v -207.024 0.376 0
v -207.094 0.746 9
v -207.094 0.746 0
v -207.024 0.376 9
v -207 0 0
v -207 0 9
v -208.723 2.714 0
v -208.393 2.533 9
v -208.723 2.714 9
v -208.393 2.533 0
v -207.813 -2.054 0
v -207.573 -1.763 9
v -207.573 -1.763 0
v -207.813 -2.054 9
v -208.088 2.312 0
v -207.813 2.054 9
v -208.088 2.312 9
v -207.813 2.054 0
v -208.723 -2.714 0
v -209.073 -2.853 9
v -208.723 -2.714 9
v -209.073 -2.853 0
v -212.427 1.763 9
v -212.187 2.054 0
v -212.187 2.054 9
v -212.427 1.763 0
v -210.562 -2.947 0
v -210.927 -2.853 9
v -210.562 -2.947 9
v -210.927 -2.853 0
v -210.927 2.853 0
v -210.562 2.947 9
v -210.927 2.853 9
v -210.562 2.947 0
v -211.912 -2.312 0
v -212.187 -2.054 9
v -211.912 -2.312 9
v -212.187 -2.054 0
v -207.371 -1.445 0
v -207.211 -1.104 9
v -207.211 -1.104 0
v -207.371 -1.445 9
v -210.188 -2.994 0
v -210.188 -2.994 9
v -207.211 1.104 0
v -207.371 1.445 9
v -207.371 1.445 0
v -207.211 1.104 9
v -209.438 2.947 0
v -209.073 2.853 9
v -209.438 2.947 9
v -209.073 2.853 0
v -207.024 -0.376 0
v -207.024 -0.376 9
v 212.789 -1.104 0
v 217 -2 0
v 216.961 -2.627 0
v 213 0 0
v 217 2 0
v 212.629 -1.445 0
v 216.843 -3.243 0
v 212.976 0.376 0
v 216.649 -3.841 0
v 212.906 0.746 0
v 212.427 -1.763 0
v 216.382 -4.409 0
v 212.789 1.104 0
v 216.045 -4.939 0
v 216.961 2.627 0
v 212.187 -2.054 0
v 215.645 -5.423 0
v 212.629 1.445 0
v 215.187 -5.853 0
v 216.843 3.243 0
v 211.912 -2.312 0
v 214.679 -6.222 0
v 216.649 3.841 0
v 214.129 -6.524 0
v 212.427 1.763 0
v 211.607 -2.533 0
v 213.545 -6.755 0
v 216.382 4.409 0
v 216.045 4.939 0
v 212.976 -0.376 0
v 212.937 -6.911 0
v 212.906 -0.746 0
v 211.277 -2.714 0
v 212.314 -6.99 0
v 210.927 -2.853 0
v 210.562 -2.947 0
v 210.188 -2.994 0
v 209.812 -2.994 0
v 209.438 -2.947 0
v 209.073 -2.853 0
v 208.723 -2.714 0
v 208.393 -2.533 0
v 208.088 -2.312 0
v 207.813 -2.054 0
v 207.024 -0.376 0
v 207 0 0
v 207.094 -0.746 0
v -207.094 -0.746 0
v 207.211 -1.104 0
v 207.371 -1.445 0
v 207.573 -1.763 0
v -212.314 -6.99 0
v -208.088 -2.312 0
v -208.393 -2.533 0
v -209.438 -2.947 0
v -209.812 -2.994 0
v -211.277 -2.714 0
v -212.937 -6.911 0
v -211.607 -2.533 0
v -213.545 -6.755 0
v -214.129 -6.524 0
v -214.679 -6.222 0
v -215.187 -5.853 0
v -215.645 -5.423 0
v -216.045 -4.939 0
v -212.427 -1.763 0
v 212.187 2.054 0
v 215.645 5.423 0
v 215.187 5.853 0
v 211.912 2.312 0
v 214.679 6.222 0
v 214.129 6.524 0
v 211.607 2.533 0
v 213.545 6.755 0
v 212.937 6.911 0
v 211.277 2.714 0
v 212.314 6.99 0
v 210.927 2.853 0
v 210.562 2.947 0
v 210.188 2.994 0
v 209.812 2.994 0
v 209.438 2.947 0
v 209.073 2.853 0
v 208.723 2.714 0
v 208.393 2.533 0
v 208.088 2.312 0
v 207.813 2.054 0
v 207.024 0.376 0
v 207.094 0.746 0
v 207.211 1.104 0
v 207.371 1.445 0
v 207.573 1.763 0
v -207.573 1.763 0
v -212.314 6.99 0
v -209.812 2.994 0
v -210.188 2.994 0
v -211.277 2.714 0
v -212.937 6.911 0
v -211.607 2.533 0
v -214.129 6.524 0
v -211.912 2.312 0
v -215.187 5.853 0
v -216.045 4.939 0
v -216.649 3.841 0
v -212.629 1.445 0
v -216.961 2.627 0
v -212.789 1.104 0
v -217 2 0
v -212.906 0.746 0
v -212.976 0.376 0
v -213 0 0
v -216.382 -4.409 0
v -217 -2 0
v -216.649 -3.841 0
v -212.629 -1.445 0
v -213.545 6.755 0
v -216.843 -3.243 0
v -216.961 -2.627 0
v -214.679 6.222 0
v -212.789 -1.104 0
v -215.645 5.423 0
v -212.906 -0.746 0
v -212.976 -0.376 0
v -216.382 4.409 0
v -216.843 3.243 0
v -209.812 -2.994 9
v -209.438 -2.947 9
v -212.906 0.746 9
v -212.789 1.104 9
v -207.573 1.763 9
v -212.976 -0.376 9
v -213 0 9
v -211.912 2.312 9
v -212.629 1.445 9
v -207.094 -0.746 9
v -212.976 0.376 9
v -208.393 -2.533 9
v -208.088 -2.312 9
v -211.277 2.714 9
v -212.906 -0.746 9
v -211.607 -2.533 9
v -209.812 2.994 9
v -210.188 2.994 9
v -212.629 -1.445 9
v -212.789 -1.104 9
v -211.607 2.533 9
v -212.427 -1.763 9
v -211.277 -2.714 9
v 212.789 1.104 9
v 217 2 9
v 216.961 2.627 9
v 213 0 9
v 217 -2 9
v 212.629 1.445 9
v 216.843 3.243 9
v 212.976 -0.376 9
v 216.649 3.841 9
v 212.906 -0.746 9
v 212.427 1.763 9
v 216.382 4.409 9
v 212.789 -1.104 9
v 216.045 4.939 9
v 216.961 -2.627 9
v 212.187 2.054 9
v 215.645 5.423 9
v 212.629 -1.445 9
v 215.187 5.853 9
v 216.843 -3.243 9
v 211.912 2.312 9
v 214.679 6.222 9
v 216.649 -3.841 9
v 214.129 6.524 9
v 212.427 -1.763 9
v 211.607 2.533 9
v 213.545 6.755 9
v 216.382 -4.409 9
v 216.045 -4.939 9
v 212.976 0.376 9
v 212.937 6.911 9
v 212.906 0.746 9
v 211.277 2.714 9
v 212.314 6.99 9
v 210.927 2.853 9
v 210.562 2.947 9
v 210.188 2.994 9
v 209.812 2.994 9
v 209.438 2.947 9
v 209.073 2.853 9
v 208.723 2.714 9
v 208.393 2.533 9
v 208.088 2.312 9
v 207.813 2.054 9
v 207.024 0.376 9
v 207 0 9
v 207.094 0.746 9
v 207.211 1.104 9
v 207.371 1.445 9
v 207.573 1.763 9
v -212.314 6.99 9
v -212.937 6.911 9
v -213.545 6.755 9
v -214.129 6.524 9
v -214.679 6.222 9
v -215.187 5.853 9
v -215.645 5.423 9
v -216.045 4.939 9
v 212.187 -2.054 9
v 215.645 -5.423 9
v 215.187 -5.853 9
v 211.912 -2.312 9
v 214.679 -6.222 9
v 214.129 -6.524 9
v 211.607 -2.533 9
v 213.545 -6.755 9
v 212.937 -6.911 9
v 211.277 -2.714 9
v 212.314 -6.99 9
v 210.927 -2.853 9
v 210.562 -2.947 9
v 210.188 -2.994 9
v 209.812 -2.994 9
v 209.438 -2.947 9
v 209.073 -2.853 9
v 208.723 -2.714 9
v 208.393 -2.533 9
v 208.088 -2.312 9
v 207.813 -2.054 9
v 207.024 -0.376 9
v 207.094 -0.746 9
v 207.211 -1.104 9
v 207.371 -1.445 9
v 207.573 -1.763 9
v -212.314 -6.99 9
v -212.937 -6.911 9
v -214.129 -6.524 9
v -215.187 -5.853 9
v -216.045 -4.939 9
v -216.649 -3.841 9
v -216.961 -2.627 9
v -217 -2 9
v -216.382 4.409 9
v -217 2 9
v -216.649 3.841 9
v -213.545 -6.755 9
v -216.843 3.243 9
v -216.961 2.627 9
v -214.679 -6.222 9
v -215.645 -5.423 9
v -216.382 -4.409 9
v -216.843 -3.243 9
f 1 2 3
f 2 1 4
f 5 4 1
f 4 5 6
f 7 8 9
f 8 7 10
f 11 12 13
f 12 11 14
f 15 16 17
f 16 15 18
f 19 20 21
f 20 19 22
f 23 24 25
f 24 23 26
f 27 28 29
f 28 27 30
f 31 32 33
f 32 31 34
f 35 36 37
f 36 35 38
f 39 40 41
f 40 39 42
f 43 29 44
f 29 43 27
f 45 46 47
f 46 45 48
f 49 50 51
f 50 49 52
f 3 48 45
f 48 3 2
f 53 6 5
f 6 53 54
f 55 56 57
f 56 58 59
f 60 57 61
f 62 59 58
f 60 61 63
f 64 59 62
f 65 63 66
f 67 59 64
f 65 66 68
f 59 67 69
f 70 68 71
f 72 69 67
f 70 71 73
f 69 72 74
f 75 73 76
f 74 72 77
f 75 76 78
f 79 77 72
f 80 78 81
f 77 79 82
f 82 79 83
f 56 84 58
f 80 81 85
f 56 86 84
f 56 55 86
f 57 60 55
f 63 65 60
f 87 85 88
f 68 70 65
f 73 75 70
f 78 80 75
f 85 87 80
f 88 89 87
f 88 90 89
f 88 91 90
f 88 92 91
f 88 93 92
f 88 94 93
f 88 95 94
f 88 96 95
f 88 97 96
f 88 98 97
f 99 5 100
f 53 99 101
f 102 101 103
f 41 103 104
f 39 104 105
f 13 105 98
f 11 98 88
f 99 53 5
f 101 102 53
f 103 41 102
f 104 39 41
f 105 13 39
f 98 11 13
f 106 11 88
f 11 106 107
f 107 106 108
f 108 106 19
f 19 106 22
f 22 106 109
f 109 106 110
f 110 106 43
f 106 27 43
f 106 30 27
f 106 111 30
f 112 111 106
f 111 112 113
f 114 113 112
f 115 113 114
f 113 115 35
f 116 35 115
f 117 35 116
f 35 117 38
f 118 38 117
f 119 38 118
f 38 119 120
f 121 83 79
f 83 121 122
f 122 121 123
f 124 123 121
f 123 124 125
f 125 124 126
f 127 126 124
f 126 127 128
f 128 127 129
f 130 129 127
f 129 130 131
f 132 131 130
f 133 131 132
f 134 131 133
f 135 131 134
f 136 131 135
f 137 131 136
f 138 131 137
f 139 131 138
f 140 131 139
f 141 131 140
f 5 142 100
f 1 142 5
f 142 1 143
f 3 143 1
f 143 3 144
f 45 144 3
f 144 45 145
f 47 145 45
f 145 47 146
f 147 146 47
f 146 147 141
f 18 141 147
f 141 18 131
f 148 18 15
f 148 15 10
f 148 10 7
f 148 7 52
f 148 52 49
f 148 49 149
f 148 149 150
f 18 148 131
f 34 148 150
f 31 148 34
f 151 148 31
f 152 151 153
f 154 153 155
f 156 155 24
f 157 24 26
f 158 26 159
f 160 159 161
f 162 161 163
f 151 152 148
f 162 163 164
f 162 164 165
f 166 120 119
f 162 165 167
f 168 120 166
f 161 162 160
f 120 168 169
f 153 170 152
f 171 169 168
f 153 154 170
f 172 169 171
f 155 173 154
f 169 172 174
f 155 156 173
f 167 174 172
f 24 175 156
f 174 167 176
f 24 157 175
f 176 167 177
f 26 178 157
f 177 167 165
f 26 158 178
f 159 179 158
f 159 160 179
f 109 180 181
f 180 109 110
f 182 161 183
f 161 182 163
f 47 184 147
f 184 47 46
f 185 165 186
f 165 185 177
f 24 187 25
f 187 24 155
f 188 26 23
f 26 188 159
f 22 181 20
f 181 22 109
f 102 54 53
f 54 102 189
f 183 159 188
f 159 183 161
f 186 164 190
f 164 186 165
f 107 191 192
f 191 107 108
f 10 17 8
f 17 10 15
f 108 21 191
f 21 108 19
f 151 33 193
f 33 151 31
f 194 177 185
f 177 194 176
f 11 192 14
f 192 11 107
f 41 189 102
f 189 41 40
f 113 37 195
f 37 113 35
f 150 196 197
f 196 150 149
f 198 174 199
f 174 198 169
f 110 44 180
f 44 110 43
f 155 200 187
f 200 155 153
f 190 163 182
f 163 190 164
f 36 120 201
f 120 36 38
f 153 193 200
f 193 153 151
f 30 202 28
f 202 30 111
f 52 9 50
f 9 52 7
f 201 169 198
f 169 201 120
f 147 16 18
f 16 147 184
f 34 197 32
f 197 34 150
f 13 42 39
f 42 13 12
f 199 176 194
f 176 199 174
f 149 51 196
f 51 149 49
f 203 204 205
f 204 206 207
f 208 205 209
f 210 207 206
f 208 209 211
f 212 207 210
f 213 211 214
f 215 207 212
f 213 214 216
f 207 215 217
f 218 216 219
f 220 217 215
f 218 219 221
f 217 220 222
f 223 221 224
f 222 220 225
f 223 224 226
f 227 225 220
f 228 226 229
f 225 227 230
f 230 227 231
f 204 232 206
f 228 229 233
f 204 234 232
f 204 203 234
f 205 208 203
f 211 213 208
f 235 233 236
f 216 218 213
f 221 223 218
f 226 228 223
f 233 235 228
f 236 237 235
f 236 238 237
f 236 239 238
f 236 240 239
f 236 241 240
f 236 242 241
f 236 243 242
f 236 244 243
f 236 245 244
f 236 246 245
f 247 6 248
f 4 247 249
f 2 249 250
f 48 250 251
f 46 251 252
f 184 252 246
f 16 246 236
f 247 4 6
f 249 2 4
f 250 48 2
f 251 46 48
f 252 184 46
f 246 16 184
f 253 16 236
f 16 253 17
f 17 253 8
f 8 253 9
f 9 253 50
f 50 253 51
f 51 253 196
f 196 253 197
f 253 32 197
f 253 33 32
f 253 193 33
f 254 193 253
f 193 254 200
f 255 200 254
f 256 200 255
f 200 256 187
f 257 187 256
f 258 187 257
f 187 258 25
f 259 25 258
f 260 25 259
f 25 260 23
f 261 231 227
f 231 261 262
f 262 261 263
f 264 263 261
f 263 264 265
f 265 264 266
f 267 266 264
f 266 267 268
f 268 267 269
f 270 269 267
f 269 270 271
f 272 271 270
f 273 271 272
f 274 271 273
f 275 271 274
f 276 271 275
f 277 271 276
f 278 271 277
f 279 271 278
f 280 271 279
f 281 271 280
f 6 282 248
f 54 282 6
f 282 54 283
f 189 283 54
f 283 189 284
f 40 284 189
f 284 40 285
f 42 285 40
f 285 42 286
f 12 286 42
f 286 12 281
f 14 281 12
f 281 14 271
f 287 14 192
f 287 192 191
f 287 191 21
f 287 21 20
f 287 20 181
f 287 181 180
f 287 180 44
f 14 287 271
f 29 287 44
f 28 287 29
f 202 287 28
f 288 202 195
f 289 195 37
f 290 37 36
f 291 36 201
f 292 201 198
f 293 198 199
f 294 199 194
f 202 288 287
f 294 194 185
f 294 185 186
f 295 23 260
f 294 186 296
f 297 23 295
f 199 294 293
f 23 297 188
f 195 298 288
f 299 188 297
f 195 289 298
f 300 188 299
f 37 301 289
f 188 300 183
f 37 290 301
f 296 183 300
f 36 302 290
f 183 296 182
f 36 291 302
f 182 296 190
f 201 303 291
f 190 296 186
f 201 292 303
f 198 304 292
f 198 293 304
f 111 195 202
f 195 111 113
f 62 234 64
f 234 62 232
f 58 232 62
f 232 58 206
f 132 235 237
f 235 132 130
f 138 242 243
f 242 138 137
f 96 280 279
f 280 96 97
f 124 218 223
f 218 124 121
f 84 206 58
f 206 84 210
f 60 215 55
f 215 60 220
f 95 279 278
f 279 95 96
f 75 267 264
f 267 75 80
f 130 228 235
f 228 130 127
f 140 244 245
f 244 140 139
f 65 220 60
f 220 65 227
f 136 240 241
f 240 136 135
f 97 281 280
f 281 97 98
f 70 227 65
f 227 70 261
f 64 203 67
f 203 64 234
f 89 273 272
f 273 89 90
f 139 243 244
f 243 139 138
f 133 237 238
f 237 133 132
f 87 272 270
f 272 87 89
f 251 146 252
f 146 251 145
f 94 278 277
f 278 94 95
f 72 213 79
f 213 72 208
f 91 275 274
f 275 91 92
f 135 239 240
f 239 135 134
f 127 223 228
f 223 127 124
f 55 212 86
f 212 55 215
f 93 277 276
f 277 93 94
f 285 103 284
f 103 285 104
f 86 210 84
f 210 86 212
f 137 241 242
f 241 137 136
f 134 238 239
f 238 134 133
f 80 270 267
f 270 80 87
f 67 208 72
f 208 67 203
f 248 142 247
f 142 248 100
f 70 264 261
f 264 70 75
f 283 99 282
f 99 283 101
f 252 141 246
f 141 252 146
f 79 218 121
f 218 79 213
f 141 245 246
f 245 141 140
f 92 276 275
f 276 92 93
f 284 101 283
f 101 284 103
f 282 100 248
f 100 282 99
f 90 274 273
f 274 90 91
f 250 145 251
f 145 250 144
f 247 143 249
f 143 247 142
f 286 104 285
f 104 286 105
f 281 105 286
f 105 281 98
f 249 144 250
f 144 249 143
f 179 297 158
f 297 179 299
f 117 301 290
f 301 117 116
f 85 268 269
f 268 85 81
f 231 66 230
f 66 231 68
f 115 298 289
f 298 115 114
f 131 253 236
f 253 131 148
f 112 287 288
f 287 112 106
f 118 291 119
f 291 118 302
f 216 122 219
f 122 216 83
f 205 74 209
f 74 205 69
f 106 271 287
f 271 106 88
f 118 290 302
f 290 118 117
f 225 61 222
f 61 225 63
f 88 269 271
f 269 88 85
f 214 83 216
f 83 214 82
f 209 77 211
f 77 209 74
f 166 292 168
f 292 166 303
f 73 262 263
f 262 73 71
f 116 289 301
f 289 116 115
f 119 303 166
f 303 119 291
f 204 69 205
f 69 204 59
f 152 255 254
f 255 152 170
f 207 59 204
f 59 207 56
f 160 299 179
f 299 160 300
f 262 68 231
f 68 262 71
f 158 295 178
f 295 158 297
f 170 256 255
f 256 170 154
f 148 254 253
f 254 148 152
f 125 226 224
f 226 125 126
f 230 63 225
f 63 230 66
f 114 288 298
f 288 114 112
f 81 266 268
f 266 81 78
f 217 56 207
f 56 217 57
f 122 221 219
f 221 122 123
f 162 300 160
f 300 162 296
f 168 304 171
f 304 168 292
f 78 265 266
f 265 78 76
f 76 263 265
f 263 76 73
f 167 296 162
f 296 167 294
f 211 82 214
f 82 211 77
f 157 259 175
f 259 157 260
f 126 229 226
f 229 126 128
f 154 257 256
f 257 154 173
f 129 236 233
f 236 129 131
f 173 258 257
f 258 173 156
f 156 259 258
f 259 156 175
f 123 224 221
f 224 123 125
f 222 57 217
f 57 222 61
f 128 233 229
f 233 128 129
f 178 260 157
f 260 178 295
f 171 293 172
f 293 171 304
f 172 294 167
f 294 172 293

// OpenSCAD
$fn = 50;


difference() {
	union() {
		hull() {
			translate(v = [-212.0000000000, 2.0000000000, 0]) {
				cylinder(h = 9, r = 5);
			}
			translate(v = [212.0000000000, 2.0000000000, 0]) {
				cylinder(h = 9, r = 5);
			}
			translate(v = [-212.0000000000, -2.0000000000, 0]) {
				cylinder(h = 9, r = 5);
			}
			translate(v = [212.0000000000, -2.0000000000, 0]) {
				cylinder(h = 9, r = 5);
			}
		}
	}
	union() {
		translate(v = [-210.0000000000, 0.0000000000, 0]) {
			cylinder(h = 9, r = 3.0000000000);
		}
		translate(v = [210.0000000000, 0.0000000000, 0]) {
			cylinder(h = 9, r = 3.0000000000);
		}
		translate(v = [-210.0000000000, 0.0000000000, 0]) {
			cylinder(h = 9, r = 1.5000000000);
		}
		translate(v = [210.0000000000, 0.0000000000, 0]) {
			cylinder(h = 9, r = 1.5000000000);
		}
		translate(v = [-210.0000000000, 0.0000000000, 0]) {
			cylinder(h = 9, r = 1.5000000000);
		}
		translate(v = [210.0000000000, 0.0000000000, 0]) {
			cylinder(h = 9, r = 1.5000000000);
		}
		translate(v = [-210.0000000000, 0.0000000000, 0]) {
			cylinder(h = 9, r = 1.5000000000);
		}
		translate(v = [210.0000000000, 0.0000000000, 0]) {
			cylinder(h = 9, r = 1.5000000000);
		}
	}
}
